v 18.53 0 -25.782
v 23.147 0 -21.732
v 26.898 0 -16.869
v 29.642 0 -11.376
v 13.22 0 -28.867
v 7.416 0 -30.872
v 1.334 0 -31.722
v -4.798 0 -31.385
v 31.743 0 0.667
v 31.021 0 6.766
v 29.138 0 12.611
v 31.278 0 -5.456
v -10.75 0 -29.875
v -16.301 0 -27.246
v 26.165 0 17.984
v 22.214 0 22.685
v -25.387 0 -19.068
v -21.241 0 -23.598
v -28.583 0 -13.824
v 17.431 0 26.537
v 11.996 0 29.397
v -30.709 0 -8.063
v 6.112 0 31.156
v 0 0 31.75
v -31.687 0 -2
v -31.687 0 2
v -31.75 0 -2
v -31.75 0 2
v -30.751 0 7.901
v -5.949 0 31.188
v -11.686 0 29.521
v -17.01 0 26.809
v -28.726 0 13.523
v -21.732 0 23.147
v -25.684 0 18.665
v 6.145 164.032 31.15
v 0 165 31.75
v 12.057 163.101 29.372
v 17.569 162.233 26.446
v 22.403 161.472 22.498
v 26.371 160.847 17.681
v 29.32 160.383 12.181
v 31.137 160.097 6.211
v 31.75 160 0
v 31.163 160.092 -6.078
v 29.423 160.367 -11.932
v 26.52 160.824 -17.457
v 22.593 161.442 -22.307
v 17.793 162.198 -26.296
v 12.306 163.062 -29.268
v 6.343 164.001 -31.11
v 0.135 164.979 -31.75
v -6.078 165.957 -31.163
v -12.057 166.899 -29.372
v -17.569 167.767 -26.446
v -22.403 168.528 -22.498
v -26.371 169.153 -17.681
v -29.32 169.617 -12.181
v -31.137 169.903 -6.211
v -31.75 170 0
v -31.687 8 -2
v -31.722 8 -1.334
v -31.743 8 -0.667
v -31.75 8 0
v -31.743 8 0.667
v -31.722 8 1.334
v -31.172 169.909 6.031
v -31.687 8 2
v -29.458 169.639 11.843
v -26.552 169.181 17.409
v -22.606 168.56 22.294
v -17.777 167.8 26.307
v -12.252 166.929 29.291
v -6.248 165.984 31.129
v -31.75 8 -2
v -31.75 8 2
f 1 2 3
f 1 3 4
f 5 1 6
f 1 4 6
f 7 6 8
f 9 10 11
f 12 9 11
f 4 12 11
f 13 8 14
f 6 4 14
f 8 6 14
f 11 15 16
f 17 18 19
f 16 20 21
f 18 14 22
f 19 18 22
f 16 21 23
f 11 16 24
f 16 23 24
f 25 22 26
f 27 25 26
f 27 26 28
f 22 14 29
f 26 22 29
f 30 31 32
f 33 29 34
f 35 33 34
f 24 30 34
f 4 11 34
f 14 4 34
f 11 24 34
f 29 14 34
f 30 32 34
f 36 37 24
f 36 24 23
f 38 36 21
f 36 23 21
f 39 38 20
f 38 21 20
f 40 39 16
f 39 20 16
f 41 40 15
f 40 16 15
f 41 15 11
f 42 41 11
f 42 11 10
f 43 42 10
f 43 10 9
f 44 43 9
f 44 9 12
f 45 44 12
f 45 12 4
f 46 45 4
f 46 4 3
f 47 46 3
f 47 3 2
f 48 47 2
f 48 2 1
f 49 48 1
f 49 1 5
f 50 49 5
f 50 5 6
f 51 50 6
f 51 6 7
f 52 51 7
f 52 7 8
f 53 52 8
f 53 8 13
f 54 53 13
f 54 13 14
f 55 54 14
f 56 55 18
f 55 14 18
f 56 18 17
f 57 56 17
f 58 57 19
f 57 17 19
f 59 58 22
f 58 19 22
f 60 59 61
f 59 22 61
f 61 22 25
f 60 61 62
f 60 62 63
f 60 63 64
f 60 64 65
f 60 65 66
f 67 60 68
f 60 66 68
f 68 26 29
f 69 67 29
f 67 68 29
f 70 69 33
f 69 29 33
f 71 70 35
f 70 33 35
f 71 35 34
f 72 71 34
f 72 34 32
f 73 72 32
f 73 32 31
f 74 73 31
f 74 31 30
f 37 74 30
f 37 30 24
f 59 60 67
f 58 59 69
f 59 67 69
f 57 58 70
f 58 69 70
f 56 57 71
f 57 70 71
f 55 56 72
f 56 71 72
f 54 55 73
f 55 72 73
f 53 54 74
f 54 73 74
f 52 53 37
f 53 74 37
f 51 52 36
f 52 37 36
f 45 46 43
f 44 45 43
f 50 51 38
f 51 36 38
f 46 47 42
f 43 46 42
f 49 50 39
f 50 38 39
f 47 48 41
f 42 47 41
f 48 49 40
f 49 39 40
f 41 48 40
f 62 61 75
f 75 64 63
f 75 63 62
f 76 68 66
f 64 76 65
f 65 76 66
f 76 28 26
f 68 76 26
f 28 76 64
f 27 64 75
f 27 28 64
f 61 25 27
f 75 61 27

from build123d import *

# Parameters (mm, degrees)
CROQUIS1_R              = 31.75
SALIENTE_EXTRUIR1_DEPTH = 170
CORTAR_EXTRUIR1_DEPTH   = 90
SALIENTE_EXTRUIR2_DEPTH = 8


with BuildPart() as part:
    # Croquis1 → Saliente-Extruir1 (new body)
    with BuildSketch(Plane(origin=(0, 0, 0), x_dir=(1, 0, 0), z_dir=(0, 1, 0))):
        with Locations(Location((0, 0, 0), (0, 0, 270))):
            Circle(CROQUIS1_R)
    extrude(amount=SALIENTE_EXTRUIR1_DEPTH)

    # Croquis2 → Cortar-Extruir1 (cut, symmetric)
    with BuildSketch(Plane.XY):
        Polygon((-31.75, 170), (31.75, 160), (31.75, 170), align=None)
    extrude(amount=CORTAR_EXTRUIR1_DEPTH, both=True, mode=Mode.SUBTRACT)

    # Croquis3 → Saliente-Extruir2 (add)
    with BuildSketch(Plane.XZ):
        Polygon((-31.75, 0), (-31.75, 2), (-28.75, 2), (-28.75, -2), (-31.75, -2), align=None)
    extrude(amount=-SALIENTE_EXTRUIR2_DEPTH)


solid = part.part
